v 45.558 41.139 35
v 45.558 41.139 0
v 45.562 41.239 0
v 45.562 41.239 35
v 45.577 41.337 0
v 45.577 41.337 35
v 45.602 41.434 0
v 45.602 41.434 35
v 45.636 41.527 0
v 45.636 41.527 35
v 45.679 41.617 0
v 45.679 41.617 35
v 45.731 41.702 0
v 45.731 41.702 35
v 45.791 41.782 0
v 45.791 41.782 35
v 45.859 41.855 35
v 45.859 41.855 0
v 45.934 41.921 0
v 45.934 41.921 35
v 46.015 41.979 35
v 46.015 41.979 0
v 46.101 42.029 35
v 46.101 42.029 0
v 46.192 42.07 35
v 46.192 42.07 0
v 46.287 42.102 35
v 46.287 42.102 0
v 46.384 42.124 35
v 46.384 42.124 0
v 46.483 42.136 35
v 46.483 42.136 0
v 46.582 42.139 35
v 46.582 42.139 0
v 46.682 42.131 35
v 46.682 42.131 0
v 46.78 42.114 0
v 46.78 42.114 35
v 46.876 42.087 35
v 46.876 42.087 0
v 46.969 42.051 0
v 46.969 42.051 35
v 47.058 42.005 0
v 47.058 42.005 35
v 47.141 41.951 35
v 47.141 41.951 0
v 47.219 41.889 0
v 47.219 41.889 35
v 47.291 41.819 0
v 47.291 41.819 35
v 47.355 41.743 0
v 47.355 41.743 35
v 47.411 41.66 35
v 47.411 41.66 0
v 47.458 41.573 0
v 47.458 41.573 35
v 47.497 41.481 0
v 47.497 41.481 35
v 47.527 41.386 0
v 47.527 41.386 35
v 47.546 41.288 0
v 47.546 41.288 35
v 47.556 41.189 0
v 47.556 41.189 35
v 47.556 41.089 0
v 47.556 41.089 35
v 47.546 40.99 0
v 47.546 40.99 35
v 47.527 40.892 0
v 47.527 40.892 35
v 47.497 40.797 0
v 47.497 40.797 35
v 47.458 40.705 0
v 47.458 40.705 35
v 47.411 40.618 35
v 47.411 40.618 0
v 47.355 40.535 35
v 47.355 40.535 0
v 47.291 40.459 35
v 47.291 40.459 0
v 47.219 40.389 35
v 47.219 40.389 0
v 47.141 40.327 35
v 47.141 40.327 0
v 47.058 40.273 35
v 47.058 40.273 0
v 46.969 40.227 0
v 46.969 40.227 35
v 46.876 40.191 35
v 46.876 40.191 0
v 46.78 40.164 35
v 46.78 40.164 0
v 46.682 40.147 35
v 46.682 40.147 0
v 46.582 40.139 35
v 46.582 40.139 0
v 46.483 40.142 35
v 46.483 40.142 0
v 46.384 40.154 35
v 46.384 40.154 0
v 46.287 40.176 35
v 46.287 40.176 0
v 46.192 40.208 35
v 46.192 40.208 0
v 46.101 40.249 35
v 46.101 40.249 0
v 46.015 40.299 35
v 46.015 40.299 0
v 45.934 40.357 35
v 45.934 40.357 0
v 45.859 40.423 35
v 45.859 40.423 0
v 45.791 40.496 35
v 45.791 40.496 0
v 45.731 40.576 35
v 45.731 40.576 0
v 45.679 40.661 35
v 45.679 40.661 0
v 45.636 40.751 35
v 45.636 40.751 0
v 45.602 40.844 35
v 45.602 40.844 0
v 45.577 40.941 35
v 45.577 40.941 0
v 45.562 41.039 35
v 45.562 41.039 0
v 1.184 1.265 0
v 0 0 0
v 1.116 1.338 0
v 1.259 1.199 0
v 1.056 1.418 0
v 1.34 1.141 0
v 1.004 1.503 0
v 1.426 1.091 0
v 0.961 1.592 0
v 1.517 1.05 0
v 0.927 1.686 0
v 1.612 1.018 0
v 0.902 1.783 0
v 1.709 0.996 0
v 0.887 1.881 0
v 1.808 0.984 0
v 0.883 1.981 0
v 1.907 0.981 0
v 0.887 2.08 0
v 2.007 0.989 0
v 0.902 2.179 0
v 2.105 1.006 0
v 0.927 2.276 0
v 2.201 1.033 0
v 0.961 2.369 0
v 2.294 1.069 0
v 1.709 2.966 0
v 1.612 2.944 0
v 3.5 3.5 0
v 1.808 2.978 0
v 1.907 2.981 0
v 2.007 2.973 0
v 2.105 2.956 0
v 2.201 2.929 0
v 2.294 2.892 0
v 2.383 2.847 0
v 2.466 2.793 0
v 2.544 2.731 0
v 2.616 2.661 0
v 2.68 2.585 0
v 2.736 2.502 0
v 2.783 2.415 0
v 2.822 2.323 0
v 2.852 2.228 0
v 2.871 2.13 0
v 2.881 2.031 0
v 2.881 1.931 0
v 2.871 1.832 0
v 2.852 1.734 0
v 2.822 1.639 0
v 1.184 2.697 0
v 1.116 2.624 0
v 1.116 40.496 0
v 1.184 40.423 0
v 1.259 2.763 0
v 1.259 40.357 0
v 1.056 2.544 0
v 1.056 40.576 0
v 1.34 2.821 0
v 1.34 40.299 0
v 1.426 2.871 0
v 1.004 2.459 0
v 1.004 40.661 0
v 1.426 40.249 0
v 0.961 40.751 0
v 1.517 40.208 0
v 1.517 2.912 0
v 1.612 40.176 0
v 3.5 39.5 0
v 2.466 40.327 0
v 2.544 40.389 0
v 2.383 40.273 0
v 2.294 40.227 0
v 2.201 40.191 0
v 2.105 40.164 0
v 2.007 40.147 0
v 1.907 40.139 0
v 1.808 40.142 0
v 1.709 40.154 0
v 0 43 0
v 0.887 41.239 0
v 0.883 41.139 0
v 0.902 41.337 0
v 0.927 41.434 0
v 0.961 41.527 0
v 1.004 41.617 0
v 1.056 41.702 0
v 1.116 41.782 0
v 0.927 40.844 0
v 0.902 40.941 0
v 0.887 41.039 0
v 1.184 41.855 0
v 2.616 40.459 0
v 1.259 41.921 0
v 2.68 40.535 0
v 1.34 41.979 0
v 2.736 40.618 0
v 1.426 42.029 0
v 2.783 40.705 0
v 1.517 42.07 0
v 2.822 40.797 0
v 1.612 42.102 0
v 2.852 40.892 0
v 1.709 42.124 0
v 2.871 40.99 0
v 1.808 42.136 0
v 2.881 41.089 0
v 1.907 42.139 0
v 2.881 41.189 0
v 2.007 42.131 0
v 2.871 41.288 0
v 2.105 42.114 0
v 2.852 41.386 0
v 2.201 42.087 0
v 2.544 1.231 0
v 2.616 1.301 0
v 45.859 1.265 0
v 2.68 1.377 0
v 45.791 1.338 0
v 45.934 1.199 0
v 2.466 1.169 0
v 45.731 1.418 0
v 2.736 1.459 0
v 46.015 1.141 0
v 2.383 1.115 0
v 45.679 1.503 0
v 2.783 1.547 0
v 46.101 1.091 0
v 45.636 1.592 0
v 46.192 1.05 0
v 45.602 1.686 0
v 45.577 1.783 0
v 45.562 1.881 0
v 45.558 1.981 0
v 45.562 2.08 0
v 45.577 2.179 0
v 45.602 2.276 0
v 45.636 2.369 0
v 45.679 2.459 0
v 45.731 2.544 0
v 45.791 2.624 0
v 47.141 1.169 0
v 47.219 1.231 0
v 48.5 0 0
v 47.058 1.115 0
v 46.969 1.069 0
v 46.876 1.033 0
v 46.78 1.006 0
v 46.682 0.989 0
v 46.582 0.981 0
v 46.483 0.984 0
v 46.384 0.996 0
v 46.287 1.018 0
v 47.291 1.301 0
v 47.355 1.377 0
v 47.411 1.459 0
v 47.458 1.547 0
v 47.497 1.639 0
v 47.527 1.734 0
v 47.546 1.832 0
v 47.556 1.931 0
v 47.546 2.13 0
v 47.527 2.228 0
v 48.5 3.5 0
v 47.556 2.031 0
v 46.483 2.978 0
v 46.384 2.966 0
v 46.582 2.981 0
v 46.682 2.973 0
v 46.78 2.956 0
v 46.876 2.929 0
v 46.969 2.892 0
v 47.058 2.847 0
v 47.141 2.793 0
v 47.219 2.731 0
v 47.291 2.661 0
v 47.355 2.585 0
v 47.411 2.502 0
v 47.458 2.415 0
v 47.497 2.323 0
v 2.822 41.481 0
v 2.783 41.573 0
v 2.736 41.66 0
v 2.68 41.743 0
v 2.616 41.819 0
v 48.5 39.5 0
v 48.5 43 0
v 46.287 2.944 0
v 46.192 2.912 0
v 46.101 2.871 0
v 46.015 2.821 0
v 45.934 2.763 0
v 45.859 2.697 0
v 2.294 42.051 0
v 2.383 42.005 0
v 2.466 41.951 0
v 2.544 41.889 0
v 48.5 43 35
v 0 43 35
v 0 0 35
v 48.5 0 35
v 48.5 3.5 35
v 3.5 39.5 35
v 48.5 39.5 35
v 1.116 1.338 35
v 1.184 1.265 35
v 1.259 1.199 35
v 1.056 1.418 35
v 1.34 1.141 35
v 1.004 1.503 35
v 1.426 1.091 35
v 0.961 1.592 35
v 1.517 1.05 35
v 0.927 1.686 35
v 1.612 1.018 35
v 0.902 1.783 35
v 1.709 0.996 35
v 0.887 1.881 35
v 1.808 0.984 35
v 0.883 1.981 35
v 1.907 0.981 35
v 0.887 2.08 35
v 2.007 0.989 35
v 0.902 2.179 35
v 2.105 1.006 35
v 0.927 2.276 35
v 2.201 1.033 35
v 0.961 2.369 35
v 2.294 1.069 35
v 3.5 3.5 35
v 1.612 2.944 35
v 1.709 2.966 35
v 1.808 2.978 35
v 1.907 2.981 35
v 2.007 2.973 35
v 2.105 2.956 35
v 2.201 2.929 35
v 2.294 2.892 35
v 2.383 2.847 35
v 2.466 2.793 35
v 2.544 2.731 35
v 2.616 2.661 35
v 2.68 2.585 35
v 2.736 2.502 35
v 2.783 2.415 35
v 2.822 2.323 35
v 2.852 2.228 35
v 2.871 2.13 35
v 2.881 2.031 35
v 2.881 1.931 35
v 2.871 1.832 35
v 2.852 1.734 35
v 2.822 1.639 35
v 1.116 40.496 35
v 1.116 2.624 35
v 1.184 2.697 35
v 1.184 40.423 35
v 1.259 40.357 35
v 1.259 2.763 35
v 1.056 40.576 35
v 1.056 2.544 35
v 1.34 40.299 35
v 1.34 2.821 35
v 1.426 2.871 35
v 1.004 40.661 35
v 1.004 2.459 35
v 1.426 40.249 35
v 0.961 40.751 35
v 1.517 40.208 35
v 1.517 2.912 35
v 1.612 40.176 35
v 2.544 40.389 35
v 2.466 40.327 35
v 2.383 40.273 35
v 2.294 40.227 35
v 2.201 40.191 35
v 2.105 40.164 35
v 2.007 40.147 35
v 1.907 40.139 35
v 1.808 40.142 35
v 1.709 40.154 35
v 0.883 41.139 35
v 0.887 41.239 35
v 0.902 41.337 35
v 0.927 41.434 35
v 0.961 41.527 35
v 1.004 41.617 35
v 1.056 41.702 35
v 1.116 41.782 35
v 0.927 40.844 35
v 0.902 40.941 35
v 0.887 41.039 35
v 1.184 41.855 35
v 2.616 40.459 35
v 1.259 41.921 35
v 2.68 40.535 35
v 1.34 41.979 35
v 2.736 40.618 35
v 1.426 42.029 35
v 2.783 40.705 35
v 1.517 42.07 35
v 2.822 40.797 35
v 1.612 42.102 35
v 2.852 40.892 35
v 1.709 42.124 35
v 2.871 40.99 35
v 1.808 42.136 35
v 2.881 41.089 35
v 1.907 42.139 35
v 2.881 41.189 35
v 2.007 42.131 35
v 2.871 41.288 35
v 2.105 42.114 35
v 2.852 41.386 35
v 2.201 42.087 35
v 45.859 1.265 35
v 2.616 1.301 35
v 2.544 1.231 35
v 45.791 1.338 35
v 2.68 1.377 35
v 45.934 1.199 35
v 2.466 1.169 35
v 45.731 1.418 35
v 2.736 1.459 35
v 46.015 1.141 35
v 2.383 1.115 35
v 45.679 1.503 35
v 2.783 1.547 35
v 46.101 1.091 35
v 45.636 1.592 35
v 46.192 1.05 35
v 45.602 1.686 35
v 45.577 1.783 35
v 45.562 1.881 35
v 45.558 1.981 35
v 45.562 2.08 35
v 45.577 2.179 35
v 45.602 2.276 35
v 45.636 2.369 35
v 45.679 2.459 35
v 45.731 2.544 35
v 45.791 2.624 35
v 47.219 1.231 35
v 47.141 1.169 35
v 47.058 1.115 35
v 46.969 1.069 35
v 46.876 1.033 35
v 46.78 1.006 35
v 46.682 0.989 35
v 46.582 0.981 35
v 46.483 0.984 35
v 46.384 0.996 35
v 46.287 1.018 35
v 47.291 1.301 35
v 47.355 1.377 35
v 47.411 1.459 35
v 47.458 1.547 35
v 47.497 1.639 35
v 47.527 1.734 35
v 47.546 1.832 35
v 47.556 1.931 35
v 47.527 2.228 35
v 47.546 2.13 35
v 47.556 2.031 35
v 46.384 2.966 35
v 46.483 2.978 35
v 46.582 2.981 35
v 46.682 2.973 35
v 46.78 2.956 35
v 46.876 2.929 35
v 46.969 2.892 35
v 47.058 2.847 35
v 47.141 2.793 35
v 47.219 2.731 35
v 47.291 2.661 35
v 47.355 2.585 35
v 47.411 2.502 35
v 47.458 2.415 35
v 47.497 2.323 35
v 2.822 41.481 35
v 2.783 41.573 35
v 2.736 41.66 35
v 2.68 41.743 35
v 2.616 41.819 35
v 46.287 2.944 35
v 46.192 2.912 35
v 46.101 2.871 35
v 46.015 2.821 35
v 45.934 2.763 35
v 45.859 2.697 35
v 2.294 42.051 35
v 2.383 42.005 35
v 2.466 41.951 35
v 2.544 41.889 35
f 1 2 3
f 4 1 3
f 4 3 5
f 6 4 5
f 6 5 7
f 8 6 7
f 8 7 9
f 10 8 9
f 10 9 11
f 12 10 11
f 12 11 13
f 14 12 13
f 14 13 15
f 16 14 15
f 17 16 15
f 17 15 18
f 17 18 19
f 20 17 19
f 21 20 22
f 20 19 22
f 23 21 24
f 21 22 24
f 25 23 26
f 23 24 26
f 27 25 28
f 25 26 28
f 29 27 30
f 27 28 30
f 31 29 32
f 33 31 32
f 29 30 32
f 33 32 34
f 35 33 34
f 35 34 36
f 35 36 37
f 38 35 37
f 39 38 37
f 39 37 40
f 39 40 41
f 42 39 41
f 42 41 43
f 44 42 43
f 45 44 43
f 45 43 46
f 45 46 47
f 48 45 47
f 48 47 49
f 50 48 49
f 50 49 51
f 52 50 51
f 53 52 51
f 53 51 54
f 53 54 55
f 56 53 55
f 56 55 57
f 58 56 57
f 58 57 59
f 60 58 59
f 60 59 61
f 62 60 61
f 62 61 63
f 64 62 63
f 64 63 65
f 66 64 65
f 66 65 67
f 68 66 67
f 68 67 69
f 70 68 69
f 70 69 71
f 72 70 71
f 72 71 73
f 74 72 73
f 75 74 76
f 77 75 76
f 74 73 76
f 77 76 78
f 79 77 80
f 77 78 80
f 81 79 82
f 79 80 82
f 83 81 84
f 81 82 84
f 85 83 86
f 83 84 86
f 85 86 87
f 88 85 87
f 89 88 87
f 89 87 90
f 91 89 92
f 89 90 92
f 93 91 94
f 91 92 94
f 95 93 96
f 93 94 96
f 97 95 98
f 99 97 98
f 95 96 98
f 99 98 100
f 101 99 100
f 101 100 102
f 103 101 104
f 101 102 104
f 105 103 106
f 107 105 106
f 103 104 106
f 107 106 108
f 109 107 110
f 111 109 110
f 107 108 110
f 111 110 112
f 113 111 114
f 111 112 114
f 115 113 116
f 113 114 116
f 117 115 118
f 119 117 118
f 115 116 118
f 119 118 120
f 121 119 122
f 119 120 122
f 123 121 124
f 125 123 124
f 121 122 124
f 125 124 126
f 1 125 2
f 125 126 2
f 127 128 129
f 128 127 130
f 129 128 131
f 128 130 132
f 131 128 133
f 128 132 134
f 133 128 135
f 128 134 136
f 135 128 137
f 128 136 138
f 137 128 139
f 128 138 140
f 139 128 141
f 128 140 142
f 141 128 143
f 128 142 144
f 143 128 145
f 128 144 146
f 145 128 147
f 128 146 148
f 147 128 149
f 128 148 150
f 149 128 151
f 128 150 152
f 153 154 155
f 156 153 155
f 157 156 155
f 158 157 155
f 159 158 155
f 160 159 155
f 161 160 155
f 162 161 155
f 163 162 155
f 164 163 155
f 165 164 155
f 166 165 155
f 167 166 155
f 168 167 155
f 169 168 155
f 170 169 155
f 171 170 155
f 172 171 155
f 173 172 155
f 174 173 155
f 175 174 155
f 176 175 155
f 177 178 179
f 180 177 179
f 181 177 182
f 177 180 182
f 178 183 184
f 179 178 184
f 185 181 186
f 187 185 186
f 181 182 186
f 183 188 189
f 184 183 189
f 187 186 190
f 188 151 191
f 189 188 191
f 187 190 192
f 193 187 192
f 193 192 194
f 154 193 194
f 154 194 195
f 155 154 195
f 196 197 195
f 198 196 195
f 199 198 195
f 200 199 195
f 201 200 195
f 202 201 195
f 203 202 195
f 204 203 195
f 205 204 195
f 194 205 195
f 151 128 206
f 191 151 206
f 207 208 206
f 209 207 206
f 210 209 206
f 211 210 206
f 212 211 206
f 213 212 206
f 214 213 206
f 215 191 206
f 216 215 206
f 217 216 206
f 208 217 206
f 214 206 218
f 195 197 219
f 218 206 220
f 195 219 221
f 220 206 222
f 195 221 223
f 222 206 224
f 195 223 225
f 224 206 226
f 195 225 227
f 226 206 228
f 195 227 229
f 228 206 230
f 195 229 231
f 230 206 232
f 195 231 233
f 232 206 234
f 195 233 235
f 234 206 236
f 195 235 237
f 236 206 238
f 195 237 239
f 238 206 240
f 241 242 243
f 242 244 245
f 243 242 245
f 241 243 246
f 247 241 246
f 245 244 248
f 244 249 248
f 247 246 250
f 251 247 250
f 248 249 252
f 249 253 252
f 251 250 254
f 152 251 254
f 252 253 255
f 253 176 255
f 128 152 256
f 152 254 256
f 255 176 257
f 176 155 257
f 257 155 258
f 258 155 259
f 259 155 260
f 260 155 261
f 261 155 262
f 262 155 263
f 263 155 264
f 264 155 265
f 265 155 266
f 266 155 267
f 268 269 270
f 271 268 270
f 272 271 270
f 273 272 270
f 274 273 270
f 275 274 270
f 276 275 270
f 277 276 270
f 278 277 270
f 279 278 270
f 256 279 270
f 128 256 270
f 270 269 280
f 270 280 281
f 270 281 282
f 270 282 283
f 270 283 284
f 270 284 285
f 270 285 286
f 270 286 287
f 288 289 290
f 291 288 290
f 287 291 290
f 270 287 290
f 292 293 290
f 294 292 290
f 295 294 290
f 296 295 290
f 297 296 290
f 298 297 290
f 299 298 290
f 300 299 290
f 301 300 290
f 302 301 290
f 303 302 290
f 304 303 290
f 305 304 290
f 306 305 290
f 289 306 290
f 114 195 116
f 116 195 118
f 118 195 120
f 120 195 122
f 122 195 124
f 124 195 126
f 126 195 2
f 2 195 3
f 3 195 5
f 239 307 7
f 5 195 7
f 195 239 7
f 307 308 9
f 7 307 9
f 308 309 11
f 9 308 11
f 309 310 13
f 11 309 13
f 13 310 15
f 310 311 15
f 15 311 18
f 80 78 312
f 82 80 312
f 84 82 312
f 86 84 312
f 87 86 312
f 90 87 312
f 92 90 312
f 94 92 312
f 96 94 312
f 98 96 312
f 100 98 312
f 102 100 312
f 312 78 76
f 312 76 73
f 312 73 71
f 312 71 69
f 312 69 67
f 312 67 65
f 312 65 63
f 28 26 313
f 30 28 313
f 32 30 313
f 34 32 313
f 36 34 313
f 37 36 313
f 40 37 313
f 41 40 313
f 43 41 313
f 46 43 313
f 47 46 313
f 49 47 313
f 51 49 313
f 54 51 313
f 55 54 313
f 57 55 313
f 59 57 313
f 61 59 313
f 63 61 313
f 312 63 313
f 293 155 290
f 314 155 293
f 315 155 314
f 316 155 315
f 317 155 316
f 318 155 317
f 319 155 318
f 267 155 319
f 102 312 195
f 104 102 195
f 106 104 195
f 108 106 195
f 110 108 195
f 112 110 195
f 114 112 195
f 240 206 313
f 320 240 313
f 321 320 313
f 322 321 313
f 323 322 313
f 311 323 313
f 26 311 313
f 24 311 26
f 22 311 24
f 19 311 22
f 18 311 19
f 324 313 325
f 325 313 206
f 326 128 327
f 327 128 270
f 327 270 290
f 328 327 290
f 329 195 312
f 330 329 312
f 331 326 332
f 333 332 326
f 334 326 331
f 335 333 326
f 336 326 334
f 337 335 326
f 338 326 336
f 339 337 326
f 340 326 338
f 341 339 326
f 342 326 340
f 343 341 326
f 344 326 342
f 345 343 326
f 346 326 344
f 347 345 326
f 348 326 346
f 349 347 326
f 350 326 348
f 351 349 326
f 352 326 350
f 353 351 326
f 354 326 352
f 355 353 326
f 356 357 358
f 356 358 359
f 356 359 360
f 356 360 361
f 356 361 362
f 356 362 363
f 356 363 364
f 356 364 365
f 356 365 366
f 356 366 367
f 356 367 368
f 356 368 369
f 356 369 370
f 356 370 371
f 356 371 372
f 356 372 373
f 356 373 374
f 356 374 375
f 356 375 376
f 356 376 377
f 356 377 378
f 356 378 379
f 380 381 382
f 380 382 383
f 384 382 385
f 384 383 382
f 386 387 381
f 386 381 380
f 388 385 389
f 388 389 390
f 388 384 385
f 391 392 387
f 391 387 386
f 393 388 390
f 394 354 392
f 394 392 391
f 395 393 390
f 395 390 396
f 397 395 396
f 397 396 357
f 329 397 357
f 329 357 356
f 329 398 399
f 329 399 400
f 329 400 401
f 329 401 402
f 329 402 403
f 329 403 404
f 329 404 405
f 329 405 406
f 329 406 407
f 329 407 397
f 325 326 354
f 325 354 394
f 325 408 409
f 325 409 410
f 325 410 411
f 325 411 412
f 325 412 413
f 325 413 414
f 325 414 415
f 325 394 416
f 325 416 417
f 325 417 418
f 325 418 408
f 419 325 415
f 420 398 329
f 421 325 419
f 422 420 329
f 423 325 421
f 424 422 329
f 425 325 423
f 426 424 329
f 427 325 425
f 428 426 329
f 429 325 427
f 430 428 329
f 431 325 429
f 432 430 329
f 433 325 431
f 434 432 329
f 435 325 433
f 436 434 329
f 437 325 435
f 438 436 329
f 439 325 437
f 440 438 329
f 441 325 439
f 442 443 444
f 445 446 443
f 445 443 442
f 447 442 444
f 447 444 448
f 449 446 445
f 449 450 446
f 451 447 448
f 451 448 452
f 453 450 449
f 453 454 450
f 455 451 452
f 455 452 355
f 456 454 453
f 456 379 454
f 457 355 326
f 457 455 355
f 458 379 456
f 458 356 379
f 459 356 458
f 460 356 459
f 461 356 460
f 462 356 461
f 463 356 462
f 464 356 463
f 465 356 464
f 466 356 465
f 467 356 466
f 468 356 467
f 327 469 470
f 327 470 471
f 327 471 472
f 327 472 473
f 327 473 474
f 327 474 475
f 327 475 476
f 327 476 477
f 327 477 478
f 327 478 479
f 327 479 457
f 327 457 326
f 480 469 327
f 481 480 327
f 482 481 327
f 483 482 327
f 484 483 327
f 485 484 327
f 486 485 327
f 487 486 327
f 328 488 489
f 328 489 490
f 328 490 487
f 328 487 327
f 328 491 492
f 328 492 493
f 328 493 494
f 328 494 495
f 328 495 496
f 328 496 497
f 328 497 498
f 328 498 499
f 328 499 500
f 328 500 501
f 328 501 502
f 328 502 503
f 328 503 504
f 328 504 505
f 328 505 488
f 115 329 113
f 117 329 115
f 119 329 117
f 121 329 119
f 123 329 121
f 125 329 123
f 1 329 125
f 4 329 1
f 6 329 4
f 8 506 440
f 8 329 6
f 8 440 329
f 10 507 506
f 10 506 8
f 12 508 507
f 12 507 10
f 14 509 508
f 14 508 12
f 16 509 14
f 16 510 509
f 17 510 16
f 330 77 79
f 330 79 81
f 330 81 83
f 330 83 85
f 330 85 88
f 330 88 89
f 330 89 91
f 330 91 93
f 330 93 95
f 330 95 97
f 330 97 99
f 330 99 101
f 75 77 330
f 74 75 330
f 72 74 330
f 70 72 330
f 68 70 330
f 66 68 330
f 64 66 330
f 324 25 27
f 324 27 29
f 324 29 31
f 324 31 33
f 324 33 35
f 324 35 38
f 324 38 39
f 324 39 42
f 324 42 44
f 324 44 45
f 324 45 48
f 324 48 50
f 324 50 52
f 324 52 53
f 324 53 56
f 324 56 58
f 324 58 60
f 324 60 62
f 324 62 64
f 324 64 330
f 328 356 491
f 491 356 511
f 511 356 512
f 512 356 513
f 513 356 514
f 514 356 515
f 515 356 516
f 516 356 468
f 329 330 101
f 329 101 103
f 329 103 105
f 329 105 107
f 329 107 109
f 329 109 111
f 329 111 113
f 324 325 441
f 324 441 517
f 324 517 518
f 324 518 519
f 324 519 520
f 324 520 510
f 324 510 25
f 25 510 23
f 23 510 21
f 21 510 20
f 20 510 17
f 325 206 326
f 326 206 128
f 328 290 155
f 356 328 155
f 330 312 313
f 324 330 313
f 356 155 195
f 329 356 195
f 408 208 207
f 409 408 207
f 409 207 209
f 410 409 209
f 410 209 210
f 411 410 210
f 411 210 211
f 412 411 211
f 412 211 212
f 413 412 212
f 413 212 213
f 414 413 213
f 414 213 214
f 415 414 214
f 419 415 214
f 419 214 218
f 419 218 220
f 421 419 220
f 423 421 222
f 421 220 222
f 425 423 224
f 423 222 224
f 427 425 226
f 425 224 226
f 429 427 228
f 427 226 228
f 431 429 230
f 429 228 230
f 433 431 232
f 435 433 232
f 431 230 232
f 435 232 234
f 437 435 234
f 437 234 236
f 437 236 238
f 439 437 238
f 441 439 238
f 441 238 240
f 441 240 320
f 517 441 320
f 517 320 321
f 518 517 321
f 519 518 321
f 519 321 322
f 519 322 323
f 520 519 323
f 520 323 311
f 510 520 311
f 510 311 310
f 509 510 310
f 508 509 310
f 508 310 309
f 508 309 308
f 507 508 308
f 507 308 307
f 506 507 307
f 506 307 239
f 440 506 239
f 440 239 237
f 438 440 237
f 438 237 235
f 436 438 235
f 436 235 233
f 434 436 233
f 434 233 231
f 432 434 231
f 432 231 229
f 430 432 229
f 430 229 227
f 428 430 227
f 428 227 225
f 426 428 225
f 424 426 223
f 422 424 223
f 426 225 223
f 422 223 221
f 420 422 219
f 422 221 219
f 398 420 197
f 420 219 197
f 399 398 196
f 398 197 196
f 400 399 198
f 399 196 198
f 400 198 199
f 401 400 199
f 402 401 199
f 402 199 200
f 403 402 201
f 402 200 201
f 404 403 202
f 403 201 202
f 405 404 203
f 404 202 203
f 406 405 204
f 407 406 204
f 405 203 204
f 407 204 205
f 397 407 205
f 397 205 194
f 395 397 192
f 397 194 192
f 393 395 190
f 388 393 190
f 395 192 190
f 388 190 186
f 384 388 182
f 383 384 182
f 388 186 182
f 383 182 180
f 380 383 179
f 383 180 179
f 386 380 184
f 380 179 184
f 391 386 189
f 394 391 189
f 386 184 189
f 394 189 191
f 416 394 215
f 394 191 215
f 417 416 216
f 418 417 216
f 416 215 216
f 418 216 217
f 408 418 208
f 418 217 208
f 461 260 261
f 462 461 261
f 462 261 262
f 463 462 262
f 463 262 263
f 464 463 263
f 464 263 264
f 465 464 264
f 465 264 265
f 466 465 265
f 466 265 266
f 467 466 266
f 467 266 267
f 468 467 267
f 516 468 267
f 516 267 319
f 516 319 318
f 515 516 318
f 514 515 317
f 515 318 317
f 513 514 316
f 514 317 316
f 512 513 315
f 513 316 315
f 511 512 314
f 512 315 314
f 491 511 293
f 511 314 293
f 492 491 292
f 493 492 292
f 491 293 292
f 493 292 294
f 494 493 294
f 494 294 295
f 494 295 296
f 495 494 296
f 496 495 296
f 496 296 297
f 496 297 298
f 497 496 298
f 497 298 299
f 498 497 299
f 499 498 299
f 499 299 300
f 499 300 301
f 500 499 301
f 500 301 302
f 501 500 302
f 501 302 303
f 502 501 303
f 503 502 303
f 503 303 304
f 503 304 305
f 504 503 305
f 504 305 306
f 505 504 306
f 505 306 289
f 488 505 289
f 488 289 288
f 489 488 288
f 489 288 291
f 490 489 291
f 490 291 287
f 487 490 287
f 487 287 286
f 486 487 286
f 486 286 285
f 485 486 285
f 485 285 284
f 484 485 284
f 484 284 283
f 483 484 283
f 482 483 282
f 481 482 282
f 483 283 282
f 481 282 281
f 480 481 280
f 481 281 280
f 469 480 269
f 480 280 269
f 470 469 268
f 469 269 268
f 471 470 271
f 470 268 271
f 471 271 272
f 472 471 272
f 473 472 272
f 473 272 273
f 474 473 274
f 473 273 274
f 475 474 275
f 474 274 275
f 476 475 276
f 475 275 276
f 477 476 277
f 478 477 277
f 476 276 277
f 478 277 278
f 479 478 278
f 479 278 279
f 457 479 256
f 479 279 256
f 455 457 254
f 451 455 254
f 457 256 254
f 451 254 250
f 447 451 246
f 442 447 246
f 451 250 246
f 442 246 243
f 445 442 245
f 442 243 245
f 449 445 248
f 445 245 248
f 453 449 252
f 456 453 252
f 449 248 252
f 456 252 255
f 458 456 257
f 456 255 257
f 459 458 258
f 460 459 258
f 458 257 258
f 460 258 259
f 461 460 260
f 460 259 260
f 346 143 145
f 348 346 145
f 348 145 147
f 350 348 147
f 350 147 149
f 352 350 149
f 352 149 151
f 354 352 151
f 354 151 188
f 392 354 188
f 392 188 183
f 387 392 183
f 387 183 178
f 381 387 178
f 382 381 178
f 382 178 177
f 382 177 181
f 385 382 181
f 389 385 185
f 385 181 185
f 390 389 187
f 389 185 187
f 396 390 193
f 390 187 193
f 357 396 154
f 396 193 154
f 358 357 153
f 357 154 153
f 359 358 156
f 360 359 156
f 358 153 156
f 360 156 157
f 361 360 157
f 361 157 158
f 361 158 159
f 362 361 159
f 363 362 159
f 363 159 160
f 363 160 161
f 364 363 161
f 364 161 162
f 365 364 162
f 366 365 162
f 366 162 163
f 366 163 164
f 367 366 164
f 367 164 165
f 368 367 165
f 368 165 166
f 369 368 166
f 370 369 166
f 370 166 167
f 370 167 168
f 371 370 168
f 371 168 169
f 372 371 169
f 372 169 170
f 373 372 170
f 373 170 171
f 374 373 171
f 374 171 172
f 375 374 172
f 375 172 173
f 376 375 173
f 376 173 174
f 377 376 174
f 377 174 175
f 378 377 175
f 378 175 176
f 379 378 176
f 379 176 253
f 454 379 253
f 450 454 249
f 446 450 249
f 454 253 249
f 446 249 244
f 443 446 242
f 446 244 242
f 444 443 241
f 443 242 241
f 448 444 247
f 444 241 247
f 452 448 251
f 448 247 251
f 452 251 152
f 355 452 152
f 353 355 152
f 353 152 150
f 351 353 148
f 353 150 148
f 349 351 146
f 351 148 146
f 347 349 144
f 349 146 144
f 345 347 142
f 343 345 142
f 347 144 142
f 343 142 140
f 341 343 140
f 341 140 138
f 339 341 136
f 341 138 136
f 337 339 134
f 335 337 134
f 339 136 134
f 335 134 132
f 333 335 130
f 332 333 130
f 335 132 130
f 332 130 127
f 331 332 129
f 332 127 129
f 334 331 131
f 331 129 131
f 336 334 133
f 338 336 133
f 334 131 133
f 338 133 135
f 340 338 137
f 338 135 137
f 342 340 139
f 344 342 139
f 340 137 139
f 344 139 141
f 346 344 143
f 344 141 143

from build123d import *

# Parameters (mm, degrees)
BOSS_EXTRUDE1_DEPTH   = 35
F_2_0MM_DOWEL_HOLE1_D = 2


with BuildPart() as part:
    # Sketch2 → Boss-Extrude1 (new body)
    with BuildSketch(Plane.XY):
        Polygon((0, 0), (48.5, 0), (48.5, 3.5), (3.5, 3.5), (3.5, 39.5), (48.5, 39.5), (48.5, 43), (0, 43), align=None)
    extrude(amount=BOSS_EXTRUDE1_DEPTH)

    # Ø2.0mm Dowel Hole1 (through all)
    with Locations(Plane.XY.offset(35)):
        with Locations((46.557508768, 1.980929828), (1.882524811, 1.980929828), (1.882524811, 41.139003015), (46.557508768, 41.139003015)):
            Hole(F_2_0MM_DOWEL_HOLE1_D / 2)


solid = part.part
